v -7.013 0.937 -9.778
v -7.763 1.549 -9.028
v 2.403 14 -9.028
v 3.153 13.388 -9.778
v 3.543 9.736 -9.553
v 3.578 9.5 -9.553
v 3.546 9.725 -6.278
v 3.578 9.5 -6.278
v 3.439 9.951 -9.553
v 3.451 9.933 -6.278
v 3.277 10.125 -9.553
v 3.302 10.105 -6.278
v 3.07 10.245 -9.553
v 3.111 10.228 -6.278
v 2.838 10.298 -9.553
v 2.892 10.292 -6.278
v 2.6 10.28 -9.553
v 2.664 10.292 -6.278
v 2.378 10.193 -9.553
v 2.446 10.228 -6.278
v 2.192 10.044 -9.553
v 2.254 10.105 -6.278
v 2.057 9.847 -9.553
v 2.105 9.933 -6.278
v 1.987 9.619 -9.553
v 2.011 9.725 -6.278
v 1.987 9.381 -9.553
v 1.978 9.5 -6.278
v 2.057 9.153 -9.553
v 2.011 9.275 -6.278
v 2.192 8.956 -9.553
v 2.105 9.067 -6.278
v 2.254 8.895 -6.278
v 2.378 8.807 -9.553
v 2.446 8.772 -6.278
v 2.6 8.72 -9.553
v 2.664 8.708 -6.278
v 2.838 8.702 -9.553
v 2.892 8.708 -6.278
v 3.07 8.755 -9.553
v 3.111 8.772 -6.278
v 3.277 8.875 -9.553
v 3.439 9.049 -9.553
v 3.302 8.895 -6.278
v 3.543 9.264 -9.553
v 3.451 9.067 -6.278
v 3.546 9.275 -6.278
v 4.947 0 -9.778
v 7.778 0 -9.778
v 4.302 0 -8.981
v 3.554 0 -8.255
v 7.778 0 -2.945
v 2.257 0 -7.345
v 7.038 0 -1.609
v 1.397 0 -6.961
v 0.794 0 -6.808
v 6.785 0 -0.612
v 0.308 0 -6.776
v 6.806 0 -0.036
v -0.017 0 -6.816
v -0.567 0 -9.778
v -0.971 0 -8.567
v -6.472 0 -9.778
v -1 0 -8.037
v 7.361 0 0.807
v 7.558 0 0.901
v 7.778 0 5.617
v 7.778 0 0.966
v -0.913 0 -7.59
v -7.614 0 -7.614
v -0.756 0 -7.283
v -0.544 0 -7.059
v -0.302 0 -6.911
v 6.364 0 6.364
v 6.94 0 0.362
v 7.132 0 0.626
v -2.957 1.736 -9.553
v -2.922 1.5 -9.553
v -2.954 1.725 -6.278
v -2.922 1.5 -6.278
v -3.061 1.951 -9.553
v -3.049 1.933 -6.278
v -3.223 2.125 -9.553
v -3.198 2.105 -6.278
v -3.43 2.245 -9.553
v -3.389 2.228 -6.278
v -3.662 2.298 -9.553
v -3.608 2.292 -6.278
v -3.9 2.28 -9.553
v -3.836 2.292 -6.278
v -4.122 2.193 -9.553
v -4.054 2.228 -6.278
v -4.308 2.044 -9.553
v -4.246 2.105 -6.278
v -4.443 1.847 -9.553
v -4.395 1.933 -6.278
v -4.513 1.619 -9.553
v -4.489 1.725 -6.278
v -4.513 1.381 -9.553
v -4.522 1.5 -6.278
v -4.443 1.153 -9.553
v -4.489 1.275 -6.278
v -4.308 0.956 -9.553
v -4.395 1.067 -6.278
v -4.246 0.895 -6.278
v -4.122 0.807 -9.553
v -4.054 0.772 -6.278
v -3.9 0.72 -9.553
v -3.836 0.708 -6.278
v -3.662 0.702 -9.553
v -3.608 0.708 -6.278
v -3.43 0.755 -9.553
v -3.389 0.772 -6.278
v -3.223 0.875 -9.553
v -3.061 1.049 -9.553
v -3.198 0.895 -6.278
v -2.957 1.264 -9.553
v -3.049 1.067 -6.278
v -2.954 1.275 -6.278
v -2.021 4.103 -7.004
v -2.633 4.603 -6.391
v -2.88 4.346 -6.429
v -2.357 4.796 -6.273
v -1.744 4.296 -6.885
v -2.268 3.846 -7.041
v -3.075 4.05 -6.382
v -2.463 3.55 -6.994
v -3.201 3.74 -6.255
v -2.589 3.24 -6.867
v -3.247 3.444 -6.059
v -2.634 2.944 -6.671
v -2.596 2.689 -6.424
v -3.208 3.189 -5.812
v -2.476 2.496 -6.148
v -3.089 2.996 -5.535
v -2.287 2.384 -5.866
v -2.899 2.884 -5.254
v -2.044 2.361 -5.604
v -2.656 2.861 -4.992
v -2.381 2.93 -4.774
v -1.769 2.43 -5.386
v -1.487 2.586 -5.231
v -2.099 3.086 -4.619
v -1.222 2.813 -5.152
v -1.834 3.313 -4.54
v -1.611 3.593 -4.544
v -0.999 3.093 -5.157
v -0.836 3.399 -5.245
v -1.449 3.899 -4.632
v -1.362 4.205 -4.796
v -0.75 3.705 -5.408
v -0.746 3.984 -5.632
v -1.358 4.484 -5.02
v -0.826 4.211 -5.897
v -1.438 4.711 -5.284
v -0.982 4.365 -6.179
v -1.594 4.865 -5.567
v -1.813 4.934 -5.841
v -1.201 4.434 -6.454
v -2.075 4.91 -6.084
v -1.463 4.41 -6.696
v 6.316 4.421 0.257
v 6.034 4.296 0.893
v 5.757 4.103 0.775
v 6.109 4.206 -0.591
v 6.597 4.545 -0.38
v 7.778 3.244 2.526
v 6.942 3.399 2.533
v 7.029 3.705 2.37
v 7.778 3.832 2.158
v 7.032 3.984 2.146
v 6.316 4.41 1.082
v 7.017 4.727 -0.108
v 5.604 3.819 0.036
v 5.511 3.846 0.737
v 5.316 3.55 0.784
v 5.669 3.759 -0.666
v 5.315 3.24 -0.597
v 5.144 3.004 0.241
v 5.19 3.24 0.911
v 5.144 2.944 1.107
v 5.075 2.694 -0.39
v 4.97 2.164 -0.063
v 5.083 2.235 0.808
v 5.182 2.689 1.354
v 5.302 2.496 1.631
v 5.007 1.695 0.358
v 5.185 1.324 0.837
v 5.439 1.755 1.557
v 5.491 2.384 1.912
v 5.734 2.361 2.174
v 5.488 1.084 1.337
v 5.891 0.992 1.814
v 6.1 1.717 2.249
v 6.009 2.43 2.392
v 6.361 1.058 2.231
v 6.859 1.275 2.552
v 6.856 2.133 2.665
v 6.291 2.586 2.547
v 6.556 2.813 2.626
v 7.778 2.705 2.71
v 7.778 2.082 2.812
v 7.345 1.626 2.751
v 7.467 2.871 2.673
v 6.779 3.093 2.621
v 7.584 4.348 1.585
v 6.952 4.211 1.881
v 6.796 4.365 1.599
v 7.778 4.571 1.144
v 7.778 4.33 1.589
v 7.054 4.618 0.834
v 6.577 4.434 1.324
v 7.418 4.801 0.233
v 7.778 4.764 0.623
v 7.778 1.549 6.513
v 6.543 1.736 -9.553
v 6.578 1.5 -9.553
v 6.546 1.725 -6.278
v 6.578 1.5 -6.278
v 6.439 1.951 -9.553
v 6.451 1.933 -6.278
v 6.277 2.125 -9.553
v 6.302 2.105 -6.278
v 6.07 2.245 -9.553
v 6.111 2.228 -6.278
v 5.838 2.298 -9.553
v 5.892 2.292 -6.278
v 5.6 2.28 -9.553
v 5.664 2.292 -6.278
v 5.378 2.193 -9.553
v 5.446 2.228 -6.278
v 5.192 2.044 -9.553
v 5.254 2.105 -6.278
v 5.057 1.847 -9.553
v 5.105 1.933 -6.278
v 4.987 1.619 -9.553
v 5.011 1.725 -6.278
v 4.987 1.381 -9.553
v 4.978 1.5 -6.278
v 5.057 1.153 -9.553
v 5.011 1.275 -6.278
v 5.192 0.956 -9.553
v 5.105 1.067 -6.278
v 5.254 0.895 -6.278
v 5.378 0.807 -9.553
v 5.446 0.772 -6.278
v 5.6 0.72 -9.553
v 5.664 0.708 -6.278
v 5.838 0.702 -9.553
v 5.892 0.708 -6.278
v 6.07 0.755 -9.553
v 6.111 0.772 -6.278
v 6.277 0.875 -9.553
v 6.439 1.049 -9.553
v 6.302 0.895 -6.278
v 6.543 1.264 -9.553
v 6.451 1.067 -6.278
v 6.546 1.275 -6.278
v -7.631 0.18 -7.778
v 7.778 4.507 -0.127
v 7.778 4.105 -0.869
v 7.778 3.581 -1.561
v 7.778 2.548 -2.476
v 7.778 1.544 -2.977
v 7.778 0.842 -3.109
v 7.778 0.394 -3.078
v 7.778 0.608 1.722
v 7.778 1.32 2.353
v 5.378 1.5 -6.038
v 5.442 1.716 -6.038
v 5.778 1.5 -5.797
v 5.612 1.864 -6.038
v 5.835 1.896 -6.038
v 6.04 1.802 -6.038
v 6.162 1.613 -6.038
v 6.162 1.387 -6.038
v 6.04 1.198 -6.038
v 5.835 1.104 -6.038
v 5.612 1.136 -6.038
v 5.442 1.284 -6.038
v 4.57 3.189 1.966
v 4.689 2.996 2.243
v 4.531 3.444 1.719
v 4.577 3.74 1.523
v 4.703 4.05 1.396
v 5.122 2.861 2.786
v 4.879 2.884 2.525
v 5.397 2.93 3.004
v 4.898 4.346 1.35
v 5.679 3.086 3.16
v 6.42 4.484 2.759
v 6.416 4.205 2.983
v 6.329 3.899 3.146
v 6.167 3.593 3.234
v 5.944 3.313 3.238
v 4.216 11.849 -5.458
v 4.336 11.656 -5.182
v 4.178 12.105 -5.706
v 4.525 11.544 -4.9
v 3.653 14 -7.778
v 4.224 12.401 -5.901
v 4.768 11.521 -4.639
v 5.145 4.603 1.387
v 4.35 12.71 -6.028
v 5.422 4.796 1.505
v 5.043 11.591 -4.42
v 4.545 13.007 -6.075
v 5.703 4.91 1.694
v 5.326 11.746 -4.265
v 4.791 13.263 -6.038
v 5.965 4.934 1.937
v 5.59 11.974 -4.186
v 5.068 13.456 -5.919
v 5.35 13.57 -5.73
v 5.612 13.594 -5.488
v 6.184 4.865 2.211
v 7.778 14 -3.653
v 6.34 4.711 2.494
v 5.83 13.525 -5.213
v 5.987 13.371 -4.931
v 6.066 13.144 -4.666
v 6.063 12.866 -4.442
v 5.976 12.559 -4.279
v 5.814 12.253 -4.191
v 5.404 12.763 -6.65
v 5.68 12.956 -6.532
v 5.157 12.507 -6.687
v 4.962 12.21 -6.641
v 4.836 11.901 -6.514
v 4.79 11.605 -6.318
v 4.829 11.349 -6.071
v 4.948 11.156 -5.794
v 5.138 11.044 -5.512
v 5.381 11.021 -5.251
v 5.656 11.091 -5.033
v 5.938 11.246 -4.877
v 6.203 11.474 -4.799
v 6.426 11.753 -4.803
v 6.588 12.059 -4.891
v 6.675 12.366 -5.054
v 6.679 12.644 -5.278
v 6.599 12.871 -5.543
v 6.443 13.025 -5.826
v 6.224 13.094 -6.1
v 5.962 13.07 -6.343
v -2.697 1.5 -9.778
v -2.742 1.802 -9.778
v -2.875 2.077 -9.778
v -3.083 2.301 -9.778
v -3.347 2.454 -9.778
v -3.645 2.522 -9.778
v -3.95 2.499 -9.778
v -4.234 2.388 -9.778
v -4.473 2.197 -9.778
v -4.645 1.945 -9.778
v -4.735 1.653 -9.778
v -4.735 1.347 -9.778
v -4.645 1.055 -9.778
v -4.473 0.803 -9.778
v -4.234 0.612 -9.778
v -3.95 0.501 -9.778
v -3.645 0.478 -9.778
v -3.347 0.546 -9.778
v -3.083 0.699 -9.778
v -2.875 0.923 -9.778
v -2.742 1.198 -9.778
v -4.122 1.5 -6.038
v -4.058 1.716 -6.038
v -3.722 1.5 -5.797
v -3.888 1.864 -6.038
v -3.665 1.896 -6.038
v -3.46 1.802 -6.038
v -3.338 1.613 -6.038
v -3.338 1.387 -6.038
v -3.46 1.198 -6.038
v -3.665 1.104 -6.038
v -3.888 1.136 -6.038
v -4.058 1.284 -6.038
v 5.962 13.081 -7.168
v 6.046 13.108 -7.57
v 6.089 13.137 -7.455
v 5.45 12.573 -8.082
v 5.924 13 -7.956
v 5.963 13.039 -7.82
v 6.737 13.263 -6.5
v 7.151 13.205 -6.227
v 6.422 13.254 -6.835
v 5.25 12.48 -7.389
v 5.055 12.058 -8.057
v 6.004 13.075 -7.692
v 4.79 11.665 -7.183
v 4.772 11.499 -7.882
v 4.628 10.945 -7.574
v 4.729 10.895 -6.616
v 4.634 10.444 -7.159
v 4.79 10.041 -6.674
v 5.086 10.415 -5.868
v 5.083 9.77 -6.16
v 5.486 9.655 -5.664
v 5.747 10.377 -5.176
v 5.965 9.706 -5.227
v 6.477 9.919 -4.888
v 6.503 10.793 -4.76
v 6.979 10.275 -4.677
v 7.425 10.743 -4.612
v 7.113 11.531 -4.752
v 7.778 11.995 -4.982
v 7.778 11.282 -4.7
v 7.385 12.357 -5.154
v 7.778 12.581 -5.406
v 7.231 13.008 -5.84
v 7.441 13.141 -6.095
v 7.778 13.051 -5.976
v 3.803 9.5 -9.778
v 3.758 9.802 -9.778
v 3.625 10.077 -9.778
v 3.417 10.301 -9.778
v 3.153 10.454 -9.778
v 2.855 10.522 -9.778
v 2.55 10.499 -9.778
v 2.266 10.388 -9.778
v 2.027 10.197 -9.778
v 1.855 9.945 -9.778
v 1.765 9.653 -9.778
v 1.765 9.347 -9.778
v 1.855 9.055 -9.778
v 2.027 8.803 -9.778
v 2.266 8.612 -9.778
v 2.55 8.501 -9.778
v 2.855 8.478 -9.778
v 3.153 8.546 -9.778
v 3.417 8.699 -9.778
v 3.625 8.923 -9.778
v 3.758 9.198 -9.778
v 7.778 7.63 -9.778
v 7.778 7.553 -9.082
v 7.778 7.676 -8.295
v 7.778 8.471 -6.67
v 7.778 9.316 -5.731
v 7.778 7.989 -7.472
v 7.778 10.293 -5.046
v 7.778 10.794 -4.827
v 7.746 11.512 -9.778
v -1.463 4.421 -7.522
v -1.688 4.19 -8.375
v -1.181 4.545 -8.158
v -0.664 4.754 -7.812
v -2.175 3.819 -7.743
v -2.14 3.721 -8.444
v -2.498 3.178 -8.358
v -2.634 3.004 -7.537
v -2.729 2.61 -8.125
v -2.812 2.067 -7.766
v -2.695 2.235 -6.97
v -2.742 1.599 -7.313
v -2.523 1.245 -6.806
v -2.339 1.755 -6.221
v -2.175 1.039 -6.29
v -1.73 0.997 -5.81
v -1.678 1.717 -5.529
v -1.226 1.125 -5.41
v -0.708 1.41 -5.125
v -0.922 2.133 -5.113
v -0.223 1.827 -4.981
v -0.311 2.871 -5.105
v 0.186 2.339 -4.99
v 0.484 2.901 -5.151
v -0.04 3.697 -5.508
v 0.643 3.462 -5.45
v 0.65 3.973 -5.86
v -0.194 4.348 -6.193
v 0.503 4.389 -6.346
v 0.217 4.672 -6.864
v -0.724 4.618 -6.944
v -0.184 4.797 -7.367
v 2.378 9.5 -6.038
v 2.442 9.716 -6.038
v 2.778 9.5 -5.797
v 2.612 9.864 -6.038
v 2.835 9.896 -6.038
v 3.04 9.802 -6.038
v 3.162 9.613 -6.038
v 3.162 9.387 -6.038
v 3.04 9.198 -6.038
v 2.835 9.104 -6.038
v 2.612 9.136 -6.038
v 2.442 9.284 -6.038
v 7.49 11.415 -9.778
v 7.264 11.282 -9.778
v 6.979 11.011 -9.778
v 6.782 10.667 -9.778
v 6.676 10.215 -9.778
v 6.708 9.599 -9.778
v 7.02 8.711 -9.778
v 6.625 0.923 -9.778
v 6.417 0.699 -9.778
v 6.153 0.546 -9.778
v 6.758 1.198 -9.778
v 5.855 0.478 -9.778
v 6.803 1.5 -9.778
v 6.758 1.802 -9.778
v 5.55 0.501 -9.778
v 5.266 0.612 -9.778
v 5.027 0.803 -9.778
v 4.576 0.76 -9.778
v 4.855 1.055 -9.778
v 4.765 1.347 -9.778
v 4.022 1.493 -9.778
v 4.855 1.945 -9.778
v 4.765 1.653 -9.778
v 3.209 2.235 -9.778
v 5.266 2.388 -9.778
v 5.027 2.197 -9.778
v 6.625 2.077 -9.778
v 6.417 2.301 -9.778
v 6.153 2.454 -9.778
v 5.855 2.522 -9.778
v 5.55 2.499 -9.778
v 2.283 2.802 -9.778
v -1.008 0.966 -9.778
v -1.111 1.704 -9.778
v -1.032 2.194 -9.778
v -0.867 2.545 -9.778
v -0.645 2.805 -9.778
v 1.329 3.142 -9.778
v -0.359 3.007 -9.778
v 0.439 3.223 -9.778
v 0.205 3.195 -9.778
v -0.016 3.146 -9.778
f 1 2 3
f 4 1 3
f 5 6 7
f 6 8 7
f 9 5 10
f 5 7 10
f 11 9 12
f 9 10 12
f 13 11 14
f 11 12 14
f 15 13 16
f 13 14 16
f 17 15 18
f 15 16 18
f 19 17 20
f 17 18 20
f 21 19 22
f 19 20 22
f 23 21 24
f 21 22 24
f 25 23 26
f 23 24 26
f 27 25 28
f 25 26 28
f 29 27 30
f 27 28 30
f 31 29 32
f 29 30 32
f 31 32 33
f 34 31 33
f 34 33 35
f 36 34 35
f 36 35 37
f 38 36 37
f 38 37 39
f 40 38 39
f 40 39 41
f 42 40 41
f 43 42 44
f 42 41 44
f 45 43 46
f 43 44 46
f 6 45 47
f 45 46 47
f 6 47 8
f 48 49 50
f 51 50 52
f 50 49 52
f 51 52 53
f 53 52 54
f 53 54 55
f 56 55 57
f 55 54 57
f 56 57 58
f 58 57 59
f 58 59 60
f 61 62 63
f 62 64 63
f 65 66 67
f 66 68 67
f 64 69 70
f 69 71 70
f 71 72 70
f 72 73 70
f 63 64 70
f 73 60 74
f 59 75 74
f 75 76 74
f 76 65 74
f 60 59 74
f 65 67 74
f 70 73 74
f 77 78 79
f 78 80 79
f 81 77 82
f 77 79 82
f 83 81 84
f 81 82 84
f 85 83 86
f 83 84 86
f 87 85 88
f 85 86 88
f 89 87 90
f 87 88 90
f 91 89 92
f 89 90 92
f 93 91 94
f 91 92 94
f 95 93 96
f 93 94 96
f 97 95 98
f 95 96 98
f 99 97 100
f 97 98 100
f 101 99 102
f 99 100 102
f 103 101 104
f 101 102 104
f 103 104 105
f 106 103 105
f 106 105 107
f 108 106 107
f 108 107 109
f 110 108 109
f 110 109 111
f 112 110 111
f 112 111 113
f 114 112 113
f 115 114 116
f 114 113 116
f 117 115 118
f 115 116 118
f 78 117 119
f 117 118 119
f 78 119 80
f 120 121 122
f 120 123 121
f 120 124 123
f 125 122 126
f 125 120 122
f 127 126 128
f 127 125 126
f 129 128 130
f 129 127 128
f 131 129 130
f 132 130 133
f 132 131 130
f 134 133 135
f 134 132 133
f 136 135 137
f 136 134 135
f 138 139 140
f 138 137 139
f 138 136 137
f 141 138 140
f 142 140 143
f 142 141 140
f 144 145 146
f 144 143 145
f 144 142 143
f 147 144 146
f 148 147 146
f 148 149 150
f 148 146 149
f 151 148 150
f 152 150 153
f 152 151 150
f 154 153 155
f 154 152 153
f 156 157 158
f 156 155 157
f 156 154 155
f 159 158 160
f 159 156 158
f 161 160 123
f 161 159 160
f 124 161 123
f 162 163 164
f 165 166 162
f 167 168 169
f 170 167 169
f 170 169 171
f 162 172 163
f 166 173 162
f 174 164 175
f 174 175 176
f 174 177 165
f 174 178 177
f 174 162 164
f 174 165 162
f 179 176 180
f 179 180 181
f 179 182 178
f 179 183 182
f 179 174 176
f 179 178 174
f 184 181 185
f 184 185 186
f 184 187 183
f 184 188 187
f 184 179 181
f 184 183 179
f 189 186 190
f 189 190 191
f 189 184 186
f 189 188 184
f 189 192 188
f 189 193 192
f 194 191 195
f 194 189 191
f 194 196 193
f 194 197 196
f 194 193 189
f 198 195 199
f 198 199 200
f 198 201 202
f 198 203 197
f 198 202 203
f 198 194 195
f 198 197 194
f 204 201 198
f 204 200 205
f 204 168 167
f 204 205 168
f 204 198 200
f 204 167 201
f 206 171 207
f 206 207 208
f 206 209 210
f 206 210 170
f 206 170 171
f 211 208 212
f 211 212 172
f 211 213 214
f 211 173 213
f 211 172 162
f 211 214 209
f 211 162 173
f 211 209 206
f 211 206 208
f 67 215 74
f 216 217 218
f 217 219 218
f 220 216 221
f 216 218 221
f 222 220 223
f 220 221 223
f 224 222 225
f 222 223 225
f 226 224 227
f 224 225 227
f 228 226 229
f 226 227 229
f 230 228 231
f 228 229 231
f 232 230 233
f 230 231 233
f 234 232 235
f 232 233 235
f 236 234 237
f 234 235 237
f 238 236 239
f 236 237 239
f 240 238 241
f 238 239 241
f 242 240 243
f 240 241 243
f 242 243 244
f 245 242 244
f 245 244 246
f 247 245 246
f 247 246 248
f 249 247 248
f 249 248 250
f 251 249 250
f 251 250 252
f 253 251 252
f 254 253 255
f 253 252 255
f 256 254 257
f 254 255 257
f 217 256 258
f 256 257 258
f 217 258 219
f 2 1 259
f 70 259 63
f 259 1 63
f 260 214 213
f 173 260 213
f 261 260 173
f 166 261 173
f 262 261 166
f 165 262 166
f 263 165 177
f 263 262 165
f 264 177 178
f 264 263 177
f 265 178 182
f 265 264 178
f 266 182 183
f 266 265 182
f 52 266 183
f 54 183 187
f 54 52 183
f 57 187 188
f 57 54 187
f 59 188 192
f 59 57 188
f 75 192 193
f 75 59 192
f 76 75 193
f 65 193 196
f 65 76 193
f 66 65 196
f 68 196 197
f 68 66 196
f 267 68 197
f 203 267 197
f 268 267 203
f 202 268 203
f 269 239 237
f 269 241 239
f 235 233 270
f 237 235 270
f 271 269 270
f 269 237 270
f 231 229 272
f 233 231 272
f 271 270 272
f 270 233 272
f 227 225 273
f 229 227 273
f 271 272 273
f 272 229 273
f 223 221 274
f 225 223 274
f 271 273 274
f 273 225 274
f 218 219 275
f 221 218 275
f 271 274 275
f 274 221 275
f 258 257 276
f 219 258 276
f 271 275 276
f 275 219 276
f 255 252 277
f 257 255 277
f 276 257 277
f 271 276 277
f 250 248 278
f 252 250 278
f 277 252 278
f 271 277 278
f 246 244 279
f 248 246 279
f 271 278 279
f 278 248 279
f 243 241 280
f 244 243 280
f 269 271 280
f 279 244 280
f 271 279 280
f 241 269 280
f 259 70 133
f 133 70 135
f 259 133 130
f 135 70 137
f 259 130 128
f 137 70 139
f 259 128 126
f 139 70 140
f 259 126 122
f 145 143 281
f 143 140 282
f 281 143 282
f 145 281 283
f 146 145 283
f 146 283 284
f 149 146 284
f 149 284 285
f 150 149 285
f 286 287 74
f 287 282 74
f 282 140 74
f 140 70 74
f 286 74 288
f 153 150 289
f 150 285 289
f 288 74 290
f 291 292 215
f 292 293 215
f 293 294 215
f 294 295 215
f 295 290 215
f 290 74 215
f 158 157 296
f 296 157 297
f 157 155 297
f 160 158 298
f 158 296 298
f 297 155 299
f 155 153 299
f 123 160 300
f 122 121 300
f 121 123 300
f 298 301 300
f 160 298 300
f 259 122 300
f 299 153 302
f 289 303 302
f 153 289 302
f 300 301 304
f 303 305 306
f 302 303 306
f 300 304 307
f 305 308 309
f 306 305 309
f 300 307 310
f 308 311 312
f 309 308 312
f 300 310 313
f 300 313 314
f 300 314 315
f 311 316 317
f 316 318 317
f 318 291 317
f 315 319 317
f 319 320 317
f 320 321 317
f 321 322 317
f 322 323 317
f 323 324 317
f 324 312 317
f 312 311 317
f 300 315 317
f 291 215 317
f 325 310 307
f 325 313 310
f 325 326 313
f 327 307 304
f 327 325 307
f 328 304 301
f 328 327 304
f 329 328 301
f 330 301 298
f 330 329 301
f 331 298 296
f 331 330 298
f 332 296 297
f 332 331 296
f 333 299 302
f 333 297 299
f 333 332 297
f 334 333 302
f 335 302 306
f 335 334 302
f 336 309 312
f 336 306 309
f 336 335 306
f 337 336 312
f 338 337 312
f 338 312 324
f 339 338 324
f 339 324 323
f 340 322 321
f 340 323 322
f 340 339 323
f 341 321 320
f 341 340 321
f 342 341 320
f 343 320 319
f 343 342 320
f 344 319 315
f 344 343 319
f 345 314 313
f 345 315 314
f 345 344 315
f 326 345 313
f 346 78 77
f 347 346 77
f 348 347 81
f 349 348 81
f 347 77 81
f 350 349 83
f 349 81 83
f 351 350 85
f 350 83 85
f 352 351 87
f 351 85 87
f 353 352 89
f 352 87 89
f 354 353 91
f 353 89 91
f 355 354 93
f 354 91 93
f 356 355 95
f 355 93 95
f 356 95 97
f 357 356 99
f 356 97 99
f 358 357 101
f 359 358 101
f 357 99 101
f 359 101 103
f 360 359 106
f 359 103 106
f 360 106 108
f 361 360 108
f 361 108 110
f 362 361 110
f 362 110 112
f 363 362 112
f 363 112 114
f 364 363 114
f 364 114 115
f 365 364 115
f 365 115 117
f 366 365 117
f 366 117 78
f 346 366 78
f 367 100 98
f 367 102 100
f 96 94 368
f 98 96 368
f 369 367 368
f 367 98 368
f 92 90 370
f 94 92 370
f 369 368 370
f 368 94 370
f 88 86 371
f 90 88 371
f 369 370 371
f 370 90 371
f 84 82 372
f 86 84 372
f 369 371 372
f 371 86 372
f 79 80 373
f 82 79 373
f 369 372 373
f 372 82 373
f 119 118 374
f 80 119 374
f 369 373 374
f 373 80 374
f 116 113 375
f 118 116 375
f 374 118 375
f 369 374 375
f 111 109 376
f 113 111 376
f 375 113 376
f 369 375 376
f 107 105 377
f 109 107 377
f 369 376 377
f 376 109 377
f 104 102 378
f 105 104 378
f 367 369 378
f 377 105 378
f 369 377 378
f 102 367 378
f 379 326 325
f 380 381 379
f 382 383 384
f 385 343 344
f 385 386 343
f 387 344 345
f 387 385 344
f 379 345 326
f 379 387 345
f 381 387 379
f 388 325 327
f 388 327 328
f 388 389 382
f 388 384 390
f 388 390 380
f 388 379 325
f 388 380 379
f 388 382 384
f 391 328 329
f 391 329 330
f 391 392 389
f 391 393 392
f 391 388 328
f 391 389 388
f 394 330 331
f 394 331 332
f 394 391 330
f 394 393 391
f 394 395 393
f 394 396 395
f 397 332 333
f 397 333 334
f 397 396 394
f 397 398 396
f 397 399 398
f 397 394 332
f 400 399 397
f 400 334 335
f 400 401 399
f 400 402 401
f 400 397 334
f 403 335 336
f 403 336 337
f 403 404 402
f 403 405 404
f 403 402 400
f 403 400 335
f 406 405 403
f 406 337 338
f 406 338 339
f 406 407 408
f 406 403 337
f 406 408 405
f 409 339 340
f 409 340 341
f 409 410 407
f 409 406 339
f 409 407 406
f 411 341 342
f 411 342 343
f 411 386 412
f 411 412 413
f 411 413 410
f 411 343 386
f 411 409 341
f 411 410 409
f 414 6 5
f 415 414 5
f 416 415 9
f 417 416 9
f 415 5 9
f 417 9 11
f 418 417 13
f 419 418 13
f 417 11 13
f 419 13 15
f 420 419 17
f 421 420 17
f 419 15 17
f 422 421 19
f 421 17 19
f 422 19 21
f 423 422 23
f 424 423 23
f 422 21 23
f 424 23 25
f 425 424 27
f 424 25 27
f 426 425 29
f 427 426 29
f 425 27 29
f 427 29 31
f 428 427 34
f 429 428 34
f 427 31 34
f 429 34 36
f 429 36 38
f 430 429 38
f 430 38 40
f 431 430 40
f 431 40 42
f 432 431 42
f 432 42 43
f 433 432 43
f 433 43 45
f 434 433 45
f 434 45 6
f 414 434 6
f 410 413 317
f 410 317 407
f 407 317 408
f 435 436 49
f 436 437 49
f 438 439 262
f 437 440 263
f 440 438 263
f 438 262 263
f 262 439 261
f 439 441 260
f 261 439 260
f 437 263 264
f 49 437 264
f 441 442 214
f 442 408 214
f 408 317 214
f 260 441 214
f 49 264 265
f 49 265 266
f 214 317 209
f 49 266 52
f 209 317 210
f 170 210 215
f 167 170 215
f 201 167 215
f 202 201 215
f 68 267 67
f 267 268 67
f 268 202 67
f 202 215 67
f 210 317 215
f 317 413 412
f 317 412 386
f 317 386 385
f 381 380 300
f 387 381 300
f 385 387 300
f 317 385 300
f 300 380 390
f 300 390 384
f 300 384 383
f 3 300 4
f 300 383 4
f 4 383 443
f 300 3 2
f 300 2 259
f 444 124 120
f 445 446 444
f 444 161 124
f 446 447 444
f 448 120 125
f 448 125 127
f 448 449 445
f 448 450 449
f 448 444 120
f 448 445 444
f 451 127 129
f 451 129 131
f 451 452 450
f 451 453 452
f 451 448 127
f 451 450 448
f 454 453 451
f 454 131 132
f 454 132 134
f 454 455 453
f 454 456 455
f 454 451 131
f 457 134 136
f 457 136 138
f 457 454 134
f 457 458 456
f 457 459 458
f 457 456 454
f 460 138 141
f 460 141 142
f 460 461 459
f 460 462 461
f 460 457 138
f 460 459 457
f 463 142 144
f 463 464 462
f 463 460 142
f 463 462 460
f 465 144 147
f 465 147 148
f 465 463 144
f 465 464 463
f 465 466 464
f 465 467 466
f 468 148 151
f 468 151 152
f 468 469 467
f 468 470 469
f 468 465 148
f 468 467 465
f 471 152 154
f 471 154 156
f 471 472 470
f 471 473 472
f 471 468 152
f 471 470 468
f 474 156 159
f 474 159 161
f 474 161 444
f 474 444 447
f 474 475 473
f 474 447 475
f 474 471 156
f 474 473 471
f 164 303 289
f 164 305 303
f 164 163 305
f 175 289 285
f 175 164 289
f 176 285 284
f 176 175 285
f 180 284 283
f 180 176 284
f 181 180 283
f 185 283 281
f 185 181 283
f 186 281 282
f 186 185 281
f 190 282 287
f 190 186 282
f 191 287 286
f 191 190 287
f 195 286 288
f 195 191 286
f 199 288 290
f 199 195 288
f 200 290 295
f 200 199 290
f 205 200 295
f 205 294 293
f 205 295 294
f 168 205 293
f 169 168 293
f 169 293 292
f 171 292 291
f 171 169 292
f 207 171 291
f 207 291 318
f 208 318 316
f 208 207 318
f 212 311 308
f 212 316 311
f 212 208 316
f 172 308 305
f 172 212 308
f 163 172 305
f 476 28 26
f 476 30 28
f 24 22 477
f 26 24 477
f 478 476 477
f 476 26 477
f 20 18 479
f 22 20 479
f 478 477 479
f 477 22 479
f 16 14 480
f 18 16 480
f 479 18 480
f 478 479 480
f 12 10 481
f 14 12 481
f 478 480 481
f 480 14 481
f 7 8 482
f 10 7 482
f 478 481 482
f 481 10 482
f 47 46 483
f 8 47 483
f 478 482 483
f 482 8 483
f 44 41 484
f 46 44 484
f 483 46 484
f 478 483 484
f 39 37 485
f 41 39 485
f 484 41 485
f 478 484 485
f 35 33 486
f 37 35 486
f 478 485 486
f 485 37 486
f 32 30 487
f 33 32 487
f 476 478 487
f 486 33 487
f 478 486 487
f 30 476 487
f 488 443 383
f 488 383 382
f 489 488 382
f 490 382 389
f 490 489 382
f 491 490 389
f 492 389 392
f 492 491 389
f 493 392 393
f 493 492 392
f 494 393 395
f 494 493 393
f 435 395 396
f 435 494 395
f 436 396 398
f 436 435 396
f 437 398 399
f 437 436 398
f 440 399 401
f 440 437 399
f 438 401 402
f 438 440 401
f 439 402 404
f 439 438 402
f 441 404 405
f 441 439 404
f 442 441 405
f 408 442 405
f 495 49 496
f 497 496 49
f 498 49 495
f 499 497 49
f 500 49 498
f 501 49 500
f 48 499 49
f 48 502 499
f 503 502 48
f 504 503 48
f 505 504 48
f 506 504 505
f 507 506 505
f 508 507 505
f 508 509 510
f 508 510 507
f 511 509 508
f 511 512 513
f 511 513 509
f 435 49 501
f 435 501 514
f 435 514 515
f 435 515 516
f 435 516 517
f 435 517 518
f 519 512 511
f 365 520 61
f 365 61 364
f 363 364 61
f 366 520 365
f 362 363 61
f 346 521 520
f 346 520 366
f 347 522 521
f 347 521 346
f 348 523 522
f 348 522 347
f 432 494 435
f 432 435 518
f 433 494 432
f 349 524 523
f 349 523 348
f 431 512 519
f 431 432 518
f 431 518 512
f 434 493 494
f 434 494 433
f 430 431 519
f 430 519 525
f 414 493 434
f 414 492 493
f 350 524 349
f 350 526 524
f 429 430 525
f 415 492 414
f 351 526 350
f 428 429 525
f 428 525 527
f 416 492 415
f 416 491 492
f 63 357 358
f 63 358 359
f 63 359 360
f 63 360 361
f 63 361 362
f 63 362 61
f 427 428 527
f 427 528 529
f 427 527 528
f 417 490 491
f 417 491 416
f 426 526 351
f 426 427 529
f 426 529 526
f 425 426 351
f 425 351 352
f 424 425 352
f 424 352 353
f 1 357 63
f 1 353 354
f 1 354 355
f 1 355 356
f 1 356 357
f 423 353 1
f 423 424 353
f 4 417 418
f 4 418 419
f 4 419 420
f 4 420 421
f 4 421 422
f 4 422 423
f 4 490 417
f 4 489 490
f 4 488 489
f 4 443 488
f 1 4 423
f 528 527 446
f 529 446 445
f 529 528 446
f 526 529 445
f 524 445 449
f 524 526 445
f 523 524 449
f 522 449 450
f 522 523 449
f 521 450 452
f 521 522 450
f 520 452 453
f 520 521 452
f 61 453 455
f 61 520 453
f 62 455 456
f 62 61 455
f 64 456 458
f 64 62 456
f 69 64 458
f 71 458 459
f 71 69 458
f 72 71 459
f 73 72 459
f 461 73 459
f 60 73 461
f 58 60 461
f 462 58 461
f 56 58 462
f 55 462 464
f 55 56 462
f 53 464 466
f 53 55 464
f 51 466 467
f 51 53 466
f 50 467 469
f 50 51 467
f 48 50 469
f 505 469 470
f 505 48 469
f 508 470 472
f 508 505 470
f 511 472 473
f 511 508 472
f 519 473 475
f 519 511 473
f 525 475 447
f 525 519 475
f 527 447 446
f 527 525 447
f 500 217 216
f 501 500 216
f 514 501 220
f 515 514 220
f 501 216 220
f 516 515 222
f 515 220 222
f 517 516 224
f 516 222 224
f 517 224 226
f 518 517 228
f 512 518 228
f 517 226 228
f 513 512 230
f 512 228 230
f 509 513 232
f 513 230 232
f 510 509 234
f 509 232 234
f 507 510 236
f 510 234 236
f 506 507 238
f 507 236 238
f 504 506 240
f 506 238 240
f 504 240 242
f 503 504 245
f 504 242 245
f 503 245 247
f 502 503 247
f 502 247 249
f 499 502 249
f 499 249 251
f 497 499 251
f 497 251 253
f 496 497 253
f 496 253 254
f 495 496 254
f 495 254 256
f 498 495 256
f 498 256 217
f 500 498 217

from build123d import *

# Parameters (mm, degrees)
BOSS_EXTRUDE1_DEPTH                            = 14
CUT_EXTRUDE1_DEPTH                             = 18.804493815
CUT_EXTRUDE1_DEPTH_BACK                        = 18.804493815
BOSS_EXTRUDE2_DEPTH                            = 2
CSK_FOR_M2_FLAT_HEAD_MACHINE_SCREW1_AT_2_COUNT = 2
CSK_FOR_M2_FLAT_HEAD_MACHINE_SCREW1_AT_2_PITCH = 11.412712211
CSK_FOR_M2_FLAT_HEAD_MACHINE_SCREW1_AT_3_COUNT = 2
CSK_FOR_M2_FLAT_HEAD_MACHINE_SCREW1_AT_3_PITCH = 11
M2X0_4_TAPPED_HOLE1_D                          = 1.6
M2X0_4_TAPPED_HOLE1_DEPTH                      = 3.5
M2X0_4_TAPPED_HOLE1_CSINK_D                    = 2.05
M2X0_4_TAPPED_HOLE1_CSINK_ANGLE                = 90
M2X0_4_TAPPED_HOLE1_TIP                        = 0.480688495
BOSS_EXTRUDE5_REACH                            = 20.765
SKETCH12_W                                     = 1.58113883
SKETCH12_H                                     = 18.073922282
CUT_EXTRUDE3_DEPTH                             = 20.541337939
CUT_EXTRUDE3_DEPTH_BACK                        = 20.541337939


with BuildPart() as part:
    # Sketch1 → Boss-Extrude1 (new body)
    with BuildSketch(Plane(origin=(0, 0, 0), x_dir=(1, 0, 0), z_dir=(0, 1, 0))):
        Polygon((-7.778174593, 7.778174593), (7.778174593, -7.778174593), (7.778174593, 7.778174593), align=None)
    extrude(amount=BOSS_EXTRUDE1_DEPTH)

    # Sketch2 → Cut-Extrude1 (cut, two sides: drawn at the far end of the back side and taken through both)
    with BuildSketch(Plane(origin=(0, 0, 0), x_dir=(0, -1, 0), z_dir=(-0.7071067811865476, 0, -0.7071067811865476)).offset(-CUT_EXTRUDE1_DEPTH_BACK)):
        Polygon((0, 0), (-14, -8.082903769), (-14, 0), align=None)
    extrude(amount=CUT_EXTRUDE1_DEPTH + CUT_EXTRUDE1_DEPTH_BACK, mode=Mode.SUBTRACT)

    # Sketch7 → Boss-Extrude2 (add)
    with BuildSketch(Plane(origin=(0, 0, -7.778174593), x_dir=(-1, 0, 0), z_dir=(0, 0, -1))):
        Polygon((-7.778174593, 0), (7.778174593, 0), (-3.65277754, 14), (-7.778174593, 14), align=None)
    extrude(amount=BOSS_EXTRUDE2_DEPTH)

    # Sketch4 → CSK for M2 Flat Head Machine Screw1 (revolve, cut)
    with BuildSketch(Plane(origin=(12.828546783, -2.102885683, -5.050372189), x_dir=(-0.048813033433799426, 0.7492053416010188, -0.6605366332638121), z_dir=(0.7890610165044198, 0.4343861831556179, 0.43438618315561783))):
        Polygon((0, 0), (0, 13.921032743), (1.2, 13.2), (1.2, 11), (2.2, 10), (2.2, 0), align=None)
    csk_for_m2_flat_head_machine_screw1 = revolve(axis=Axis((16.717111749, -5.277885683, -8.938937156), (-0.6123724356957967, 0.4999999999999948, 0.6123724356957967)), mode=Mode.SUBTRACT)

    # CSK for M2 Flat Head Machine Screw1 at 2: CSK for M2 Flat Head Machine Screw1 ×2
    with Locations(*[Vector(-0.030978910540443338, 0.7588252361140443, -0.6505571213492264) * (i * CSK_FOR_M2_FLAT_HEAD_MACHINE_SCREW1_AT_2_PITCH) for i in range(1, CSK_FOR_M2_FLAT_HEAD_MACHINE_SCREW1_AT_2_COUNT)]):
        add(csk_for_m2_flat_head_machine_screw1, mode=Mode.SUBTRACT)

    # CSK for M2 Flat Head Machine Screw1 at 3: CSK for M2 Flat Head Machine Screw1 ×2
    with Locations(*[Vector(-0.7071067811865477, 0, -0.7071067811865474) * (i * CSK_FOR_M2_FLAT_HEAD_MACHINE_SCREW1_AT_3_PITCH) for i in range(1, CSK_FOR_M2_FLAT_HEAD_MACHINE_SCREW1_AT_3_COUNT)]):
        add(csk_for_m2_flat_head_machine_screw1, mode=Mode.SUBTRACT)

    # M2x0.4 Tapped Hole1
    with Locations(Plane(origin=(0, 0, -9.778174593), x_dir=(-1, 0, 0), z_dir=(0, 0, -1))):
        with Locations((-2.778174593, 9.5), (-5.778174593, 1.5), (3.721825407, 1.5)):
            CounterSinkHole(M2X0_4_TAPPED_HOLE1_D / 2, M2X0_4_TAPPED_HOLE1_CSINK_D / 2, depth=M2X0_4_TAPPED_HOLE1_DEPTH, counter_sink_angle=M2X0_4_TAPPED_HOLE1_CSINK_ANGLE)
            with Locations((0, 0, -(M2X0_4_TAPPED_HOLE1_DEPTH + M2X0_4_TAPPED_HOLE1_TIP / 2))):  # 118° drill point
                Cone(0, M2X0_4_TAPPED_HOLE1_D / 2, M2X0_4_TAPPED_HOLE1_TIP, mode=Mode.SUBTRACT)

    # Boss-Extrude5: up to this face of the body (flat: up to its plane)
    boss_extrude5_end = Plane(part.part.faces().sort_by_distance((-2.062698527, 7, -8.778174593))[0])
    # Sketch12 → Boss-Extrude5 (add, up to the picked face)
    with BuildSketch(Plane(origin=(0, 0, 0), x_dir=(0.4743416490252608, -0.3872983346207397, 0.7905694150420935), z_dir=(-0.6123724356957969, 0.4999999999999949, 0.6123724356957962)), mode=Mode.PRIVATE) as boss_extrude5_sk1:
        with Locations((-10.629268516, 4.117611591)):
            Rectangle(SKETCH12_W, SKETCH12_H)
    boss_extrude5_tool1 = split(extrude(boss_extrude5_sk1.sketch, amount=-BOSS_EXTRUDE5_REACH, mode=Mode.PRIVATE), bisect_by=boss_extrude5_end, keep=Keep.BOTH, mode=Mode.PRIVATE)
    add(boss_extrude5_tool1.solids().sort_by(Axis((-2.437699, 7.306186, -8.403175), (0.6123724356957969, -0.4999999999999949, -0.6123724356957962)))[0])

    # Sketch9 → Cut-Extrude3 (cut, two sides: drawn at the far end of the back side and taken through both)
    with BuildSketch(Plane(origin=(0, 0, 0), x_dir=(0.4743416490252609, -0.3872983346207397, 0.7905694150420934), z_dir=(-0.6123724356957968, 0.49999999999999495, 0.6123724356957964)).offset(-CUT_EXTRUDE3_DEPTH_BACK)):
        Polygon((8.238699101, 6.11934955), (8.049844719, 4.024922359), (9.838699101, 4.91934955), align=None)
        Polygon((-9.630983549, -4.815491775), (-11.419837931, -5.709918966), (-11.419837931, -3.709918966), align=None)
        Polygon((-4.620438725, 15.76370292), (-11.419837931, 12.364003317), (-11.419837931, 20.863252325), align=None)
    extrude(amount=CUT_EXTRUDE3_DEPTH + CUT_EXTRUDE3_DEPTH_BACK, mode=Mode.SUBTRACT)


solid = part.part
